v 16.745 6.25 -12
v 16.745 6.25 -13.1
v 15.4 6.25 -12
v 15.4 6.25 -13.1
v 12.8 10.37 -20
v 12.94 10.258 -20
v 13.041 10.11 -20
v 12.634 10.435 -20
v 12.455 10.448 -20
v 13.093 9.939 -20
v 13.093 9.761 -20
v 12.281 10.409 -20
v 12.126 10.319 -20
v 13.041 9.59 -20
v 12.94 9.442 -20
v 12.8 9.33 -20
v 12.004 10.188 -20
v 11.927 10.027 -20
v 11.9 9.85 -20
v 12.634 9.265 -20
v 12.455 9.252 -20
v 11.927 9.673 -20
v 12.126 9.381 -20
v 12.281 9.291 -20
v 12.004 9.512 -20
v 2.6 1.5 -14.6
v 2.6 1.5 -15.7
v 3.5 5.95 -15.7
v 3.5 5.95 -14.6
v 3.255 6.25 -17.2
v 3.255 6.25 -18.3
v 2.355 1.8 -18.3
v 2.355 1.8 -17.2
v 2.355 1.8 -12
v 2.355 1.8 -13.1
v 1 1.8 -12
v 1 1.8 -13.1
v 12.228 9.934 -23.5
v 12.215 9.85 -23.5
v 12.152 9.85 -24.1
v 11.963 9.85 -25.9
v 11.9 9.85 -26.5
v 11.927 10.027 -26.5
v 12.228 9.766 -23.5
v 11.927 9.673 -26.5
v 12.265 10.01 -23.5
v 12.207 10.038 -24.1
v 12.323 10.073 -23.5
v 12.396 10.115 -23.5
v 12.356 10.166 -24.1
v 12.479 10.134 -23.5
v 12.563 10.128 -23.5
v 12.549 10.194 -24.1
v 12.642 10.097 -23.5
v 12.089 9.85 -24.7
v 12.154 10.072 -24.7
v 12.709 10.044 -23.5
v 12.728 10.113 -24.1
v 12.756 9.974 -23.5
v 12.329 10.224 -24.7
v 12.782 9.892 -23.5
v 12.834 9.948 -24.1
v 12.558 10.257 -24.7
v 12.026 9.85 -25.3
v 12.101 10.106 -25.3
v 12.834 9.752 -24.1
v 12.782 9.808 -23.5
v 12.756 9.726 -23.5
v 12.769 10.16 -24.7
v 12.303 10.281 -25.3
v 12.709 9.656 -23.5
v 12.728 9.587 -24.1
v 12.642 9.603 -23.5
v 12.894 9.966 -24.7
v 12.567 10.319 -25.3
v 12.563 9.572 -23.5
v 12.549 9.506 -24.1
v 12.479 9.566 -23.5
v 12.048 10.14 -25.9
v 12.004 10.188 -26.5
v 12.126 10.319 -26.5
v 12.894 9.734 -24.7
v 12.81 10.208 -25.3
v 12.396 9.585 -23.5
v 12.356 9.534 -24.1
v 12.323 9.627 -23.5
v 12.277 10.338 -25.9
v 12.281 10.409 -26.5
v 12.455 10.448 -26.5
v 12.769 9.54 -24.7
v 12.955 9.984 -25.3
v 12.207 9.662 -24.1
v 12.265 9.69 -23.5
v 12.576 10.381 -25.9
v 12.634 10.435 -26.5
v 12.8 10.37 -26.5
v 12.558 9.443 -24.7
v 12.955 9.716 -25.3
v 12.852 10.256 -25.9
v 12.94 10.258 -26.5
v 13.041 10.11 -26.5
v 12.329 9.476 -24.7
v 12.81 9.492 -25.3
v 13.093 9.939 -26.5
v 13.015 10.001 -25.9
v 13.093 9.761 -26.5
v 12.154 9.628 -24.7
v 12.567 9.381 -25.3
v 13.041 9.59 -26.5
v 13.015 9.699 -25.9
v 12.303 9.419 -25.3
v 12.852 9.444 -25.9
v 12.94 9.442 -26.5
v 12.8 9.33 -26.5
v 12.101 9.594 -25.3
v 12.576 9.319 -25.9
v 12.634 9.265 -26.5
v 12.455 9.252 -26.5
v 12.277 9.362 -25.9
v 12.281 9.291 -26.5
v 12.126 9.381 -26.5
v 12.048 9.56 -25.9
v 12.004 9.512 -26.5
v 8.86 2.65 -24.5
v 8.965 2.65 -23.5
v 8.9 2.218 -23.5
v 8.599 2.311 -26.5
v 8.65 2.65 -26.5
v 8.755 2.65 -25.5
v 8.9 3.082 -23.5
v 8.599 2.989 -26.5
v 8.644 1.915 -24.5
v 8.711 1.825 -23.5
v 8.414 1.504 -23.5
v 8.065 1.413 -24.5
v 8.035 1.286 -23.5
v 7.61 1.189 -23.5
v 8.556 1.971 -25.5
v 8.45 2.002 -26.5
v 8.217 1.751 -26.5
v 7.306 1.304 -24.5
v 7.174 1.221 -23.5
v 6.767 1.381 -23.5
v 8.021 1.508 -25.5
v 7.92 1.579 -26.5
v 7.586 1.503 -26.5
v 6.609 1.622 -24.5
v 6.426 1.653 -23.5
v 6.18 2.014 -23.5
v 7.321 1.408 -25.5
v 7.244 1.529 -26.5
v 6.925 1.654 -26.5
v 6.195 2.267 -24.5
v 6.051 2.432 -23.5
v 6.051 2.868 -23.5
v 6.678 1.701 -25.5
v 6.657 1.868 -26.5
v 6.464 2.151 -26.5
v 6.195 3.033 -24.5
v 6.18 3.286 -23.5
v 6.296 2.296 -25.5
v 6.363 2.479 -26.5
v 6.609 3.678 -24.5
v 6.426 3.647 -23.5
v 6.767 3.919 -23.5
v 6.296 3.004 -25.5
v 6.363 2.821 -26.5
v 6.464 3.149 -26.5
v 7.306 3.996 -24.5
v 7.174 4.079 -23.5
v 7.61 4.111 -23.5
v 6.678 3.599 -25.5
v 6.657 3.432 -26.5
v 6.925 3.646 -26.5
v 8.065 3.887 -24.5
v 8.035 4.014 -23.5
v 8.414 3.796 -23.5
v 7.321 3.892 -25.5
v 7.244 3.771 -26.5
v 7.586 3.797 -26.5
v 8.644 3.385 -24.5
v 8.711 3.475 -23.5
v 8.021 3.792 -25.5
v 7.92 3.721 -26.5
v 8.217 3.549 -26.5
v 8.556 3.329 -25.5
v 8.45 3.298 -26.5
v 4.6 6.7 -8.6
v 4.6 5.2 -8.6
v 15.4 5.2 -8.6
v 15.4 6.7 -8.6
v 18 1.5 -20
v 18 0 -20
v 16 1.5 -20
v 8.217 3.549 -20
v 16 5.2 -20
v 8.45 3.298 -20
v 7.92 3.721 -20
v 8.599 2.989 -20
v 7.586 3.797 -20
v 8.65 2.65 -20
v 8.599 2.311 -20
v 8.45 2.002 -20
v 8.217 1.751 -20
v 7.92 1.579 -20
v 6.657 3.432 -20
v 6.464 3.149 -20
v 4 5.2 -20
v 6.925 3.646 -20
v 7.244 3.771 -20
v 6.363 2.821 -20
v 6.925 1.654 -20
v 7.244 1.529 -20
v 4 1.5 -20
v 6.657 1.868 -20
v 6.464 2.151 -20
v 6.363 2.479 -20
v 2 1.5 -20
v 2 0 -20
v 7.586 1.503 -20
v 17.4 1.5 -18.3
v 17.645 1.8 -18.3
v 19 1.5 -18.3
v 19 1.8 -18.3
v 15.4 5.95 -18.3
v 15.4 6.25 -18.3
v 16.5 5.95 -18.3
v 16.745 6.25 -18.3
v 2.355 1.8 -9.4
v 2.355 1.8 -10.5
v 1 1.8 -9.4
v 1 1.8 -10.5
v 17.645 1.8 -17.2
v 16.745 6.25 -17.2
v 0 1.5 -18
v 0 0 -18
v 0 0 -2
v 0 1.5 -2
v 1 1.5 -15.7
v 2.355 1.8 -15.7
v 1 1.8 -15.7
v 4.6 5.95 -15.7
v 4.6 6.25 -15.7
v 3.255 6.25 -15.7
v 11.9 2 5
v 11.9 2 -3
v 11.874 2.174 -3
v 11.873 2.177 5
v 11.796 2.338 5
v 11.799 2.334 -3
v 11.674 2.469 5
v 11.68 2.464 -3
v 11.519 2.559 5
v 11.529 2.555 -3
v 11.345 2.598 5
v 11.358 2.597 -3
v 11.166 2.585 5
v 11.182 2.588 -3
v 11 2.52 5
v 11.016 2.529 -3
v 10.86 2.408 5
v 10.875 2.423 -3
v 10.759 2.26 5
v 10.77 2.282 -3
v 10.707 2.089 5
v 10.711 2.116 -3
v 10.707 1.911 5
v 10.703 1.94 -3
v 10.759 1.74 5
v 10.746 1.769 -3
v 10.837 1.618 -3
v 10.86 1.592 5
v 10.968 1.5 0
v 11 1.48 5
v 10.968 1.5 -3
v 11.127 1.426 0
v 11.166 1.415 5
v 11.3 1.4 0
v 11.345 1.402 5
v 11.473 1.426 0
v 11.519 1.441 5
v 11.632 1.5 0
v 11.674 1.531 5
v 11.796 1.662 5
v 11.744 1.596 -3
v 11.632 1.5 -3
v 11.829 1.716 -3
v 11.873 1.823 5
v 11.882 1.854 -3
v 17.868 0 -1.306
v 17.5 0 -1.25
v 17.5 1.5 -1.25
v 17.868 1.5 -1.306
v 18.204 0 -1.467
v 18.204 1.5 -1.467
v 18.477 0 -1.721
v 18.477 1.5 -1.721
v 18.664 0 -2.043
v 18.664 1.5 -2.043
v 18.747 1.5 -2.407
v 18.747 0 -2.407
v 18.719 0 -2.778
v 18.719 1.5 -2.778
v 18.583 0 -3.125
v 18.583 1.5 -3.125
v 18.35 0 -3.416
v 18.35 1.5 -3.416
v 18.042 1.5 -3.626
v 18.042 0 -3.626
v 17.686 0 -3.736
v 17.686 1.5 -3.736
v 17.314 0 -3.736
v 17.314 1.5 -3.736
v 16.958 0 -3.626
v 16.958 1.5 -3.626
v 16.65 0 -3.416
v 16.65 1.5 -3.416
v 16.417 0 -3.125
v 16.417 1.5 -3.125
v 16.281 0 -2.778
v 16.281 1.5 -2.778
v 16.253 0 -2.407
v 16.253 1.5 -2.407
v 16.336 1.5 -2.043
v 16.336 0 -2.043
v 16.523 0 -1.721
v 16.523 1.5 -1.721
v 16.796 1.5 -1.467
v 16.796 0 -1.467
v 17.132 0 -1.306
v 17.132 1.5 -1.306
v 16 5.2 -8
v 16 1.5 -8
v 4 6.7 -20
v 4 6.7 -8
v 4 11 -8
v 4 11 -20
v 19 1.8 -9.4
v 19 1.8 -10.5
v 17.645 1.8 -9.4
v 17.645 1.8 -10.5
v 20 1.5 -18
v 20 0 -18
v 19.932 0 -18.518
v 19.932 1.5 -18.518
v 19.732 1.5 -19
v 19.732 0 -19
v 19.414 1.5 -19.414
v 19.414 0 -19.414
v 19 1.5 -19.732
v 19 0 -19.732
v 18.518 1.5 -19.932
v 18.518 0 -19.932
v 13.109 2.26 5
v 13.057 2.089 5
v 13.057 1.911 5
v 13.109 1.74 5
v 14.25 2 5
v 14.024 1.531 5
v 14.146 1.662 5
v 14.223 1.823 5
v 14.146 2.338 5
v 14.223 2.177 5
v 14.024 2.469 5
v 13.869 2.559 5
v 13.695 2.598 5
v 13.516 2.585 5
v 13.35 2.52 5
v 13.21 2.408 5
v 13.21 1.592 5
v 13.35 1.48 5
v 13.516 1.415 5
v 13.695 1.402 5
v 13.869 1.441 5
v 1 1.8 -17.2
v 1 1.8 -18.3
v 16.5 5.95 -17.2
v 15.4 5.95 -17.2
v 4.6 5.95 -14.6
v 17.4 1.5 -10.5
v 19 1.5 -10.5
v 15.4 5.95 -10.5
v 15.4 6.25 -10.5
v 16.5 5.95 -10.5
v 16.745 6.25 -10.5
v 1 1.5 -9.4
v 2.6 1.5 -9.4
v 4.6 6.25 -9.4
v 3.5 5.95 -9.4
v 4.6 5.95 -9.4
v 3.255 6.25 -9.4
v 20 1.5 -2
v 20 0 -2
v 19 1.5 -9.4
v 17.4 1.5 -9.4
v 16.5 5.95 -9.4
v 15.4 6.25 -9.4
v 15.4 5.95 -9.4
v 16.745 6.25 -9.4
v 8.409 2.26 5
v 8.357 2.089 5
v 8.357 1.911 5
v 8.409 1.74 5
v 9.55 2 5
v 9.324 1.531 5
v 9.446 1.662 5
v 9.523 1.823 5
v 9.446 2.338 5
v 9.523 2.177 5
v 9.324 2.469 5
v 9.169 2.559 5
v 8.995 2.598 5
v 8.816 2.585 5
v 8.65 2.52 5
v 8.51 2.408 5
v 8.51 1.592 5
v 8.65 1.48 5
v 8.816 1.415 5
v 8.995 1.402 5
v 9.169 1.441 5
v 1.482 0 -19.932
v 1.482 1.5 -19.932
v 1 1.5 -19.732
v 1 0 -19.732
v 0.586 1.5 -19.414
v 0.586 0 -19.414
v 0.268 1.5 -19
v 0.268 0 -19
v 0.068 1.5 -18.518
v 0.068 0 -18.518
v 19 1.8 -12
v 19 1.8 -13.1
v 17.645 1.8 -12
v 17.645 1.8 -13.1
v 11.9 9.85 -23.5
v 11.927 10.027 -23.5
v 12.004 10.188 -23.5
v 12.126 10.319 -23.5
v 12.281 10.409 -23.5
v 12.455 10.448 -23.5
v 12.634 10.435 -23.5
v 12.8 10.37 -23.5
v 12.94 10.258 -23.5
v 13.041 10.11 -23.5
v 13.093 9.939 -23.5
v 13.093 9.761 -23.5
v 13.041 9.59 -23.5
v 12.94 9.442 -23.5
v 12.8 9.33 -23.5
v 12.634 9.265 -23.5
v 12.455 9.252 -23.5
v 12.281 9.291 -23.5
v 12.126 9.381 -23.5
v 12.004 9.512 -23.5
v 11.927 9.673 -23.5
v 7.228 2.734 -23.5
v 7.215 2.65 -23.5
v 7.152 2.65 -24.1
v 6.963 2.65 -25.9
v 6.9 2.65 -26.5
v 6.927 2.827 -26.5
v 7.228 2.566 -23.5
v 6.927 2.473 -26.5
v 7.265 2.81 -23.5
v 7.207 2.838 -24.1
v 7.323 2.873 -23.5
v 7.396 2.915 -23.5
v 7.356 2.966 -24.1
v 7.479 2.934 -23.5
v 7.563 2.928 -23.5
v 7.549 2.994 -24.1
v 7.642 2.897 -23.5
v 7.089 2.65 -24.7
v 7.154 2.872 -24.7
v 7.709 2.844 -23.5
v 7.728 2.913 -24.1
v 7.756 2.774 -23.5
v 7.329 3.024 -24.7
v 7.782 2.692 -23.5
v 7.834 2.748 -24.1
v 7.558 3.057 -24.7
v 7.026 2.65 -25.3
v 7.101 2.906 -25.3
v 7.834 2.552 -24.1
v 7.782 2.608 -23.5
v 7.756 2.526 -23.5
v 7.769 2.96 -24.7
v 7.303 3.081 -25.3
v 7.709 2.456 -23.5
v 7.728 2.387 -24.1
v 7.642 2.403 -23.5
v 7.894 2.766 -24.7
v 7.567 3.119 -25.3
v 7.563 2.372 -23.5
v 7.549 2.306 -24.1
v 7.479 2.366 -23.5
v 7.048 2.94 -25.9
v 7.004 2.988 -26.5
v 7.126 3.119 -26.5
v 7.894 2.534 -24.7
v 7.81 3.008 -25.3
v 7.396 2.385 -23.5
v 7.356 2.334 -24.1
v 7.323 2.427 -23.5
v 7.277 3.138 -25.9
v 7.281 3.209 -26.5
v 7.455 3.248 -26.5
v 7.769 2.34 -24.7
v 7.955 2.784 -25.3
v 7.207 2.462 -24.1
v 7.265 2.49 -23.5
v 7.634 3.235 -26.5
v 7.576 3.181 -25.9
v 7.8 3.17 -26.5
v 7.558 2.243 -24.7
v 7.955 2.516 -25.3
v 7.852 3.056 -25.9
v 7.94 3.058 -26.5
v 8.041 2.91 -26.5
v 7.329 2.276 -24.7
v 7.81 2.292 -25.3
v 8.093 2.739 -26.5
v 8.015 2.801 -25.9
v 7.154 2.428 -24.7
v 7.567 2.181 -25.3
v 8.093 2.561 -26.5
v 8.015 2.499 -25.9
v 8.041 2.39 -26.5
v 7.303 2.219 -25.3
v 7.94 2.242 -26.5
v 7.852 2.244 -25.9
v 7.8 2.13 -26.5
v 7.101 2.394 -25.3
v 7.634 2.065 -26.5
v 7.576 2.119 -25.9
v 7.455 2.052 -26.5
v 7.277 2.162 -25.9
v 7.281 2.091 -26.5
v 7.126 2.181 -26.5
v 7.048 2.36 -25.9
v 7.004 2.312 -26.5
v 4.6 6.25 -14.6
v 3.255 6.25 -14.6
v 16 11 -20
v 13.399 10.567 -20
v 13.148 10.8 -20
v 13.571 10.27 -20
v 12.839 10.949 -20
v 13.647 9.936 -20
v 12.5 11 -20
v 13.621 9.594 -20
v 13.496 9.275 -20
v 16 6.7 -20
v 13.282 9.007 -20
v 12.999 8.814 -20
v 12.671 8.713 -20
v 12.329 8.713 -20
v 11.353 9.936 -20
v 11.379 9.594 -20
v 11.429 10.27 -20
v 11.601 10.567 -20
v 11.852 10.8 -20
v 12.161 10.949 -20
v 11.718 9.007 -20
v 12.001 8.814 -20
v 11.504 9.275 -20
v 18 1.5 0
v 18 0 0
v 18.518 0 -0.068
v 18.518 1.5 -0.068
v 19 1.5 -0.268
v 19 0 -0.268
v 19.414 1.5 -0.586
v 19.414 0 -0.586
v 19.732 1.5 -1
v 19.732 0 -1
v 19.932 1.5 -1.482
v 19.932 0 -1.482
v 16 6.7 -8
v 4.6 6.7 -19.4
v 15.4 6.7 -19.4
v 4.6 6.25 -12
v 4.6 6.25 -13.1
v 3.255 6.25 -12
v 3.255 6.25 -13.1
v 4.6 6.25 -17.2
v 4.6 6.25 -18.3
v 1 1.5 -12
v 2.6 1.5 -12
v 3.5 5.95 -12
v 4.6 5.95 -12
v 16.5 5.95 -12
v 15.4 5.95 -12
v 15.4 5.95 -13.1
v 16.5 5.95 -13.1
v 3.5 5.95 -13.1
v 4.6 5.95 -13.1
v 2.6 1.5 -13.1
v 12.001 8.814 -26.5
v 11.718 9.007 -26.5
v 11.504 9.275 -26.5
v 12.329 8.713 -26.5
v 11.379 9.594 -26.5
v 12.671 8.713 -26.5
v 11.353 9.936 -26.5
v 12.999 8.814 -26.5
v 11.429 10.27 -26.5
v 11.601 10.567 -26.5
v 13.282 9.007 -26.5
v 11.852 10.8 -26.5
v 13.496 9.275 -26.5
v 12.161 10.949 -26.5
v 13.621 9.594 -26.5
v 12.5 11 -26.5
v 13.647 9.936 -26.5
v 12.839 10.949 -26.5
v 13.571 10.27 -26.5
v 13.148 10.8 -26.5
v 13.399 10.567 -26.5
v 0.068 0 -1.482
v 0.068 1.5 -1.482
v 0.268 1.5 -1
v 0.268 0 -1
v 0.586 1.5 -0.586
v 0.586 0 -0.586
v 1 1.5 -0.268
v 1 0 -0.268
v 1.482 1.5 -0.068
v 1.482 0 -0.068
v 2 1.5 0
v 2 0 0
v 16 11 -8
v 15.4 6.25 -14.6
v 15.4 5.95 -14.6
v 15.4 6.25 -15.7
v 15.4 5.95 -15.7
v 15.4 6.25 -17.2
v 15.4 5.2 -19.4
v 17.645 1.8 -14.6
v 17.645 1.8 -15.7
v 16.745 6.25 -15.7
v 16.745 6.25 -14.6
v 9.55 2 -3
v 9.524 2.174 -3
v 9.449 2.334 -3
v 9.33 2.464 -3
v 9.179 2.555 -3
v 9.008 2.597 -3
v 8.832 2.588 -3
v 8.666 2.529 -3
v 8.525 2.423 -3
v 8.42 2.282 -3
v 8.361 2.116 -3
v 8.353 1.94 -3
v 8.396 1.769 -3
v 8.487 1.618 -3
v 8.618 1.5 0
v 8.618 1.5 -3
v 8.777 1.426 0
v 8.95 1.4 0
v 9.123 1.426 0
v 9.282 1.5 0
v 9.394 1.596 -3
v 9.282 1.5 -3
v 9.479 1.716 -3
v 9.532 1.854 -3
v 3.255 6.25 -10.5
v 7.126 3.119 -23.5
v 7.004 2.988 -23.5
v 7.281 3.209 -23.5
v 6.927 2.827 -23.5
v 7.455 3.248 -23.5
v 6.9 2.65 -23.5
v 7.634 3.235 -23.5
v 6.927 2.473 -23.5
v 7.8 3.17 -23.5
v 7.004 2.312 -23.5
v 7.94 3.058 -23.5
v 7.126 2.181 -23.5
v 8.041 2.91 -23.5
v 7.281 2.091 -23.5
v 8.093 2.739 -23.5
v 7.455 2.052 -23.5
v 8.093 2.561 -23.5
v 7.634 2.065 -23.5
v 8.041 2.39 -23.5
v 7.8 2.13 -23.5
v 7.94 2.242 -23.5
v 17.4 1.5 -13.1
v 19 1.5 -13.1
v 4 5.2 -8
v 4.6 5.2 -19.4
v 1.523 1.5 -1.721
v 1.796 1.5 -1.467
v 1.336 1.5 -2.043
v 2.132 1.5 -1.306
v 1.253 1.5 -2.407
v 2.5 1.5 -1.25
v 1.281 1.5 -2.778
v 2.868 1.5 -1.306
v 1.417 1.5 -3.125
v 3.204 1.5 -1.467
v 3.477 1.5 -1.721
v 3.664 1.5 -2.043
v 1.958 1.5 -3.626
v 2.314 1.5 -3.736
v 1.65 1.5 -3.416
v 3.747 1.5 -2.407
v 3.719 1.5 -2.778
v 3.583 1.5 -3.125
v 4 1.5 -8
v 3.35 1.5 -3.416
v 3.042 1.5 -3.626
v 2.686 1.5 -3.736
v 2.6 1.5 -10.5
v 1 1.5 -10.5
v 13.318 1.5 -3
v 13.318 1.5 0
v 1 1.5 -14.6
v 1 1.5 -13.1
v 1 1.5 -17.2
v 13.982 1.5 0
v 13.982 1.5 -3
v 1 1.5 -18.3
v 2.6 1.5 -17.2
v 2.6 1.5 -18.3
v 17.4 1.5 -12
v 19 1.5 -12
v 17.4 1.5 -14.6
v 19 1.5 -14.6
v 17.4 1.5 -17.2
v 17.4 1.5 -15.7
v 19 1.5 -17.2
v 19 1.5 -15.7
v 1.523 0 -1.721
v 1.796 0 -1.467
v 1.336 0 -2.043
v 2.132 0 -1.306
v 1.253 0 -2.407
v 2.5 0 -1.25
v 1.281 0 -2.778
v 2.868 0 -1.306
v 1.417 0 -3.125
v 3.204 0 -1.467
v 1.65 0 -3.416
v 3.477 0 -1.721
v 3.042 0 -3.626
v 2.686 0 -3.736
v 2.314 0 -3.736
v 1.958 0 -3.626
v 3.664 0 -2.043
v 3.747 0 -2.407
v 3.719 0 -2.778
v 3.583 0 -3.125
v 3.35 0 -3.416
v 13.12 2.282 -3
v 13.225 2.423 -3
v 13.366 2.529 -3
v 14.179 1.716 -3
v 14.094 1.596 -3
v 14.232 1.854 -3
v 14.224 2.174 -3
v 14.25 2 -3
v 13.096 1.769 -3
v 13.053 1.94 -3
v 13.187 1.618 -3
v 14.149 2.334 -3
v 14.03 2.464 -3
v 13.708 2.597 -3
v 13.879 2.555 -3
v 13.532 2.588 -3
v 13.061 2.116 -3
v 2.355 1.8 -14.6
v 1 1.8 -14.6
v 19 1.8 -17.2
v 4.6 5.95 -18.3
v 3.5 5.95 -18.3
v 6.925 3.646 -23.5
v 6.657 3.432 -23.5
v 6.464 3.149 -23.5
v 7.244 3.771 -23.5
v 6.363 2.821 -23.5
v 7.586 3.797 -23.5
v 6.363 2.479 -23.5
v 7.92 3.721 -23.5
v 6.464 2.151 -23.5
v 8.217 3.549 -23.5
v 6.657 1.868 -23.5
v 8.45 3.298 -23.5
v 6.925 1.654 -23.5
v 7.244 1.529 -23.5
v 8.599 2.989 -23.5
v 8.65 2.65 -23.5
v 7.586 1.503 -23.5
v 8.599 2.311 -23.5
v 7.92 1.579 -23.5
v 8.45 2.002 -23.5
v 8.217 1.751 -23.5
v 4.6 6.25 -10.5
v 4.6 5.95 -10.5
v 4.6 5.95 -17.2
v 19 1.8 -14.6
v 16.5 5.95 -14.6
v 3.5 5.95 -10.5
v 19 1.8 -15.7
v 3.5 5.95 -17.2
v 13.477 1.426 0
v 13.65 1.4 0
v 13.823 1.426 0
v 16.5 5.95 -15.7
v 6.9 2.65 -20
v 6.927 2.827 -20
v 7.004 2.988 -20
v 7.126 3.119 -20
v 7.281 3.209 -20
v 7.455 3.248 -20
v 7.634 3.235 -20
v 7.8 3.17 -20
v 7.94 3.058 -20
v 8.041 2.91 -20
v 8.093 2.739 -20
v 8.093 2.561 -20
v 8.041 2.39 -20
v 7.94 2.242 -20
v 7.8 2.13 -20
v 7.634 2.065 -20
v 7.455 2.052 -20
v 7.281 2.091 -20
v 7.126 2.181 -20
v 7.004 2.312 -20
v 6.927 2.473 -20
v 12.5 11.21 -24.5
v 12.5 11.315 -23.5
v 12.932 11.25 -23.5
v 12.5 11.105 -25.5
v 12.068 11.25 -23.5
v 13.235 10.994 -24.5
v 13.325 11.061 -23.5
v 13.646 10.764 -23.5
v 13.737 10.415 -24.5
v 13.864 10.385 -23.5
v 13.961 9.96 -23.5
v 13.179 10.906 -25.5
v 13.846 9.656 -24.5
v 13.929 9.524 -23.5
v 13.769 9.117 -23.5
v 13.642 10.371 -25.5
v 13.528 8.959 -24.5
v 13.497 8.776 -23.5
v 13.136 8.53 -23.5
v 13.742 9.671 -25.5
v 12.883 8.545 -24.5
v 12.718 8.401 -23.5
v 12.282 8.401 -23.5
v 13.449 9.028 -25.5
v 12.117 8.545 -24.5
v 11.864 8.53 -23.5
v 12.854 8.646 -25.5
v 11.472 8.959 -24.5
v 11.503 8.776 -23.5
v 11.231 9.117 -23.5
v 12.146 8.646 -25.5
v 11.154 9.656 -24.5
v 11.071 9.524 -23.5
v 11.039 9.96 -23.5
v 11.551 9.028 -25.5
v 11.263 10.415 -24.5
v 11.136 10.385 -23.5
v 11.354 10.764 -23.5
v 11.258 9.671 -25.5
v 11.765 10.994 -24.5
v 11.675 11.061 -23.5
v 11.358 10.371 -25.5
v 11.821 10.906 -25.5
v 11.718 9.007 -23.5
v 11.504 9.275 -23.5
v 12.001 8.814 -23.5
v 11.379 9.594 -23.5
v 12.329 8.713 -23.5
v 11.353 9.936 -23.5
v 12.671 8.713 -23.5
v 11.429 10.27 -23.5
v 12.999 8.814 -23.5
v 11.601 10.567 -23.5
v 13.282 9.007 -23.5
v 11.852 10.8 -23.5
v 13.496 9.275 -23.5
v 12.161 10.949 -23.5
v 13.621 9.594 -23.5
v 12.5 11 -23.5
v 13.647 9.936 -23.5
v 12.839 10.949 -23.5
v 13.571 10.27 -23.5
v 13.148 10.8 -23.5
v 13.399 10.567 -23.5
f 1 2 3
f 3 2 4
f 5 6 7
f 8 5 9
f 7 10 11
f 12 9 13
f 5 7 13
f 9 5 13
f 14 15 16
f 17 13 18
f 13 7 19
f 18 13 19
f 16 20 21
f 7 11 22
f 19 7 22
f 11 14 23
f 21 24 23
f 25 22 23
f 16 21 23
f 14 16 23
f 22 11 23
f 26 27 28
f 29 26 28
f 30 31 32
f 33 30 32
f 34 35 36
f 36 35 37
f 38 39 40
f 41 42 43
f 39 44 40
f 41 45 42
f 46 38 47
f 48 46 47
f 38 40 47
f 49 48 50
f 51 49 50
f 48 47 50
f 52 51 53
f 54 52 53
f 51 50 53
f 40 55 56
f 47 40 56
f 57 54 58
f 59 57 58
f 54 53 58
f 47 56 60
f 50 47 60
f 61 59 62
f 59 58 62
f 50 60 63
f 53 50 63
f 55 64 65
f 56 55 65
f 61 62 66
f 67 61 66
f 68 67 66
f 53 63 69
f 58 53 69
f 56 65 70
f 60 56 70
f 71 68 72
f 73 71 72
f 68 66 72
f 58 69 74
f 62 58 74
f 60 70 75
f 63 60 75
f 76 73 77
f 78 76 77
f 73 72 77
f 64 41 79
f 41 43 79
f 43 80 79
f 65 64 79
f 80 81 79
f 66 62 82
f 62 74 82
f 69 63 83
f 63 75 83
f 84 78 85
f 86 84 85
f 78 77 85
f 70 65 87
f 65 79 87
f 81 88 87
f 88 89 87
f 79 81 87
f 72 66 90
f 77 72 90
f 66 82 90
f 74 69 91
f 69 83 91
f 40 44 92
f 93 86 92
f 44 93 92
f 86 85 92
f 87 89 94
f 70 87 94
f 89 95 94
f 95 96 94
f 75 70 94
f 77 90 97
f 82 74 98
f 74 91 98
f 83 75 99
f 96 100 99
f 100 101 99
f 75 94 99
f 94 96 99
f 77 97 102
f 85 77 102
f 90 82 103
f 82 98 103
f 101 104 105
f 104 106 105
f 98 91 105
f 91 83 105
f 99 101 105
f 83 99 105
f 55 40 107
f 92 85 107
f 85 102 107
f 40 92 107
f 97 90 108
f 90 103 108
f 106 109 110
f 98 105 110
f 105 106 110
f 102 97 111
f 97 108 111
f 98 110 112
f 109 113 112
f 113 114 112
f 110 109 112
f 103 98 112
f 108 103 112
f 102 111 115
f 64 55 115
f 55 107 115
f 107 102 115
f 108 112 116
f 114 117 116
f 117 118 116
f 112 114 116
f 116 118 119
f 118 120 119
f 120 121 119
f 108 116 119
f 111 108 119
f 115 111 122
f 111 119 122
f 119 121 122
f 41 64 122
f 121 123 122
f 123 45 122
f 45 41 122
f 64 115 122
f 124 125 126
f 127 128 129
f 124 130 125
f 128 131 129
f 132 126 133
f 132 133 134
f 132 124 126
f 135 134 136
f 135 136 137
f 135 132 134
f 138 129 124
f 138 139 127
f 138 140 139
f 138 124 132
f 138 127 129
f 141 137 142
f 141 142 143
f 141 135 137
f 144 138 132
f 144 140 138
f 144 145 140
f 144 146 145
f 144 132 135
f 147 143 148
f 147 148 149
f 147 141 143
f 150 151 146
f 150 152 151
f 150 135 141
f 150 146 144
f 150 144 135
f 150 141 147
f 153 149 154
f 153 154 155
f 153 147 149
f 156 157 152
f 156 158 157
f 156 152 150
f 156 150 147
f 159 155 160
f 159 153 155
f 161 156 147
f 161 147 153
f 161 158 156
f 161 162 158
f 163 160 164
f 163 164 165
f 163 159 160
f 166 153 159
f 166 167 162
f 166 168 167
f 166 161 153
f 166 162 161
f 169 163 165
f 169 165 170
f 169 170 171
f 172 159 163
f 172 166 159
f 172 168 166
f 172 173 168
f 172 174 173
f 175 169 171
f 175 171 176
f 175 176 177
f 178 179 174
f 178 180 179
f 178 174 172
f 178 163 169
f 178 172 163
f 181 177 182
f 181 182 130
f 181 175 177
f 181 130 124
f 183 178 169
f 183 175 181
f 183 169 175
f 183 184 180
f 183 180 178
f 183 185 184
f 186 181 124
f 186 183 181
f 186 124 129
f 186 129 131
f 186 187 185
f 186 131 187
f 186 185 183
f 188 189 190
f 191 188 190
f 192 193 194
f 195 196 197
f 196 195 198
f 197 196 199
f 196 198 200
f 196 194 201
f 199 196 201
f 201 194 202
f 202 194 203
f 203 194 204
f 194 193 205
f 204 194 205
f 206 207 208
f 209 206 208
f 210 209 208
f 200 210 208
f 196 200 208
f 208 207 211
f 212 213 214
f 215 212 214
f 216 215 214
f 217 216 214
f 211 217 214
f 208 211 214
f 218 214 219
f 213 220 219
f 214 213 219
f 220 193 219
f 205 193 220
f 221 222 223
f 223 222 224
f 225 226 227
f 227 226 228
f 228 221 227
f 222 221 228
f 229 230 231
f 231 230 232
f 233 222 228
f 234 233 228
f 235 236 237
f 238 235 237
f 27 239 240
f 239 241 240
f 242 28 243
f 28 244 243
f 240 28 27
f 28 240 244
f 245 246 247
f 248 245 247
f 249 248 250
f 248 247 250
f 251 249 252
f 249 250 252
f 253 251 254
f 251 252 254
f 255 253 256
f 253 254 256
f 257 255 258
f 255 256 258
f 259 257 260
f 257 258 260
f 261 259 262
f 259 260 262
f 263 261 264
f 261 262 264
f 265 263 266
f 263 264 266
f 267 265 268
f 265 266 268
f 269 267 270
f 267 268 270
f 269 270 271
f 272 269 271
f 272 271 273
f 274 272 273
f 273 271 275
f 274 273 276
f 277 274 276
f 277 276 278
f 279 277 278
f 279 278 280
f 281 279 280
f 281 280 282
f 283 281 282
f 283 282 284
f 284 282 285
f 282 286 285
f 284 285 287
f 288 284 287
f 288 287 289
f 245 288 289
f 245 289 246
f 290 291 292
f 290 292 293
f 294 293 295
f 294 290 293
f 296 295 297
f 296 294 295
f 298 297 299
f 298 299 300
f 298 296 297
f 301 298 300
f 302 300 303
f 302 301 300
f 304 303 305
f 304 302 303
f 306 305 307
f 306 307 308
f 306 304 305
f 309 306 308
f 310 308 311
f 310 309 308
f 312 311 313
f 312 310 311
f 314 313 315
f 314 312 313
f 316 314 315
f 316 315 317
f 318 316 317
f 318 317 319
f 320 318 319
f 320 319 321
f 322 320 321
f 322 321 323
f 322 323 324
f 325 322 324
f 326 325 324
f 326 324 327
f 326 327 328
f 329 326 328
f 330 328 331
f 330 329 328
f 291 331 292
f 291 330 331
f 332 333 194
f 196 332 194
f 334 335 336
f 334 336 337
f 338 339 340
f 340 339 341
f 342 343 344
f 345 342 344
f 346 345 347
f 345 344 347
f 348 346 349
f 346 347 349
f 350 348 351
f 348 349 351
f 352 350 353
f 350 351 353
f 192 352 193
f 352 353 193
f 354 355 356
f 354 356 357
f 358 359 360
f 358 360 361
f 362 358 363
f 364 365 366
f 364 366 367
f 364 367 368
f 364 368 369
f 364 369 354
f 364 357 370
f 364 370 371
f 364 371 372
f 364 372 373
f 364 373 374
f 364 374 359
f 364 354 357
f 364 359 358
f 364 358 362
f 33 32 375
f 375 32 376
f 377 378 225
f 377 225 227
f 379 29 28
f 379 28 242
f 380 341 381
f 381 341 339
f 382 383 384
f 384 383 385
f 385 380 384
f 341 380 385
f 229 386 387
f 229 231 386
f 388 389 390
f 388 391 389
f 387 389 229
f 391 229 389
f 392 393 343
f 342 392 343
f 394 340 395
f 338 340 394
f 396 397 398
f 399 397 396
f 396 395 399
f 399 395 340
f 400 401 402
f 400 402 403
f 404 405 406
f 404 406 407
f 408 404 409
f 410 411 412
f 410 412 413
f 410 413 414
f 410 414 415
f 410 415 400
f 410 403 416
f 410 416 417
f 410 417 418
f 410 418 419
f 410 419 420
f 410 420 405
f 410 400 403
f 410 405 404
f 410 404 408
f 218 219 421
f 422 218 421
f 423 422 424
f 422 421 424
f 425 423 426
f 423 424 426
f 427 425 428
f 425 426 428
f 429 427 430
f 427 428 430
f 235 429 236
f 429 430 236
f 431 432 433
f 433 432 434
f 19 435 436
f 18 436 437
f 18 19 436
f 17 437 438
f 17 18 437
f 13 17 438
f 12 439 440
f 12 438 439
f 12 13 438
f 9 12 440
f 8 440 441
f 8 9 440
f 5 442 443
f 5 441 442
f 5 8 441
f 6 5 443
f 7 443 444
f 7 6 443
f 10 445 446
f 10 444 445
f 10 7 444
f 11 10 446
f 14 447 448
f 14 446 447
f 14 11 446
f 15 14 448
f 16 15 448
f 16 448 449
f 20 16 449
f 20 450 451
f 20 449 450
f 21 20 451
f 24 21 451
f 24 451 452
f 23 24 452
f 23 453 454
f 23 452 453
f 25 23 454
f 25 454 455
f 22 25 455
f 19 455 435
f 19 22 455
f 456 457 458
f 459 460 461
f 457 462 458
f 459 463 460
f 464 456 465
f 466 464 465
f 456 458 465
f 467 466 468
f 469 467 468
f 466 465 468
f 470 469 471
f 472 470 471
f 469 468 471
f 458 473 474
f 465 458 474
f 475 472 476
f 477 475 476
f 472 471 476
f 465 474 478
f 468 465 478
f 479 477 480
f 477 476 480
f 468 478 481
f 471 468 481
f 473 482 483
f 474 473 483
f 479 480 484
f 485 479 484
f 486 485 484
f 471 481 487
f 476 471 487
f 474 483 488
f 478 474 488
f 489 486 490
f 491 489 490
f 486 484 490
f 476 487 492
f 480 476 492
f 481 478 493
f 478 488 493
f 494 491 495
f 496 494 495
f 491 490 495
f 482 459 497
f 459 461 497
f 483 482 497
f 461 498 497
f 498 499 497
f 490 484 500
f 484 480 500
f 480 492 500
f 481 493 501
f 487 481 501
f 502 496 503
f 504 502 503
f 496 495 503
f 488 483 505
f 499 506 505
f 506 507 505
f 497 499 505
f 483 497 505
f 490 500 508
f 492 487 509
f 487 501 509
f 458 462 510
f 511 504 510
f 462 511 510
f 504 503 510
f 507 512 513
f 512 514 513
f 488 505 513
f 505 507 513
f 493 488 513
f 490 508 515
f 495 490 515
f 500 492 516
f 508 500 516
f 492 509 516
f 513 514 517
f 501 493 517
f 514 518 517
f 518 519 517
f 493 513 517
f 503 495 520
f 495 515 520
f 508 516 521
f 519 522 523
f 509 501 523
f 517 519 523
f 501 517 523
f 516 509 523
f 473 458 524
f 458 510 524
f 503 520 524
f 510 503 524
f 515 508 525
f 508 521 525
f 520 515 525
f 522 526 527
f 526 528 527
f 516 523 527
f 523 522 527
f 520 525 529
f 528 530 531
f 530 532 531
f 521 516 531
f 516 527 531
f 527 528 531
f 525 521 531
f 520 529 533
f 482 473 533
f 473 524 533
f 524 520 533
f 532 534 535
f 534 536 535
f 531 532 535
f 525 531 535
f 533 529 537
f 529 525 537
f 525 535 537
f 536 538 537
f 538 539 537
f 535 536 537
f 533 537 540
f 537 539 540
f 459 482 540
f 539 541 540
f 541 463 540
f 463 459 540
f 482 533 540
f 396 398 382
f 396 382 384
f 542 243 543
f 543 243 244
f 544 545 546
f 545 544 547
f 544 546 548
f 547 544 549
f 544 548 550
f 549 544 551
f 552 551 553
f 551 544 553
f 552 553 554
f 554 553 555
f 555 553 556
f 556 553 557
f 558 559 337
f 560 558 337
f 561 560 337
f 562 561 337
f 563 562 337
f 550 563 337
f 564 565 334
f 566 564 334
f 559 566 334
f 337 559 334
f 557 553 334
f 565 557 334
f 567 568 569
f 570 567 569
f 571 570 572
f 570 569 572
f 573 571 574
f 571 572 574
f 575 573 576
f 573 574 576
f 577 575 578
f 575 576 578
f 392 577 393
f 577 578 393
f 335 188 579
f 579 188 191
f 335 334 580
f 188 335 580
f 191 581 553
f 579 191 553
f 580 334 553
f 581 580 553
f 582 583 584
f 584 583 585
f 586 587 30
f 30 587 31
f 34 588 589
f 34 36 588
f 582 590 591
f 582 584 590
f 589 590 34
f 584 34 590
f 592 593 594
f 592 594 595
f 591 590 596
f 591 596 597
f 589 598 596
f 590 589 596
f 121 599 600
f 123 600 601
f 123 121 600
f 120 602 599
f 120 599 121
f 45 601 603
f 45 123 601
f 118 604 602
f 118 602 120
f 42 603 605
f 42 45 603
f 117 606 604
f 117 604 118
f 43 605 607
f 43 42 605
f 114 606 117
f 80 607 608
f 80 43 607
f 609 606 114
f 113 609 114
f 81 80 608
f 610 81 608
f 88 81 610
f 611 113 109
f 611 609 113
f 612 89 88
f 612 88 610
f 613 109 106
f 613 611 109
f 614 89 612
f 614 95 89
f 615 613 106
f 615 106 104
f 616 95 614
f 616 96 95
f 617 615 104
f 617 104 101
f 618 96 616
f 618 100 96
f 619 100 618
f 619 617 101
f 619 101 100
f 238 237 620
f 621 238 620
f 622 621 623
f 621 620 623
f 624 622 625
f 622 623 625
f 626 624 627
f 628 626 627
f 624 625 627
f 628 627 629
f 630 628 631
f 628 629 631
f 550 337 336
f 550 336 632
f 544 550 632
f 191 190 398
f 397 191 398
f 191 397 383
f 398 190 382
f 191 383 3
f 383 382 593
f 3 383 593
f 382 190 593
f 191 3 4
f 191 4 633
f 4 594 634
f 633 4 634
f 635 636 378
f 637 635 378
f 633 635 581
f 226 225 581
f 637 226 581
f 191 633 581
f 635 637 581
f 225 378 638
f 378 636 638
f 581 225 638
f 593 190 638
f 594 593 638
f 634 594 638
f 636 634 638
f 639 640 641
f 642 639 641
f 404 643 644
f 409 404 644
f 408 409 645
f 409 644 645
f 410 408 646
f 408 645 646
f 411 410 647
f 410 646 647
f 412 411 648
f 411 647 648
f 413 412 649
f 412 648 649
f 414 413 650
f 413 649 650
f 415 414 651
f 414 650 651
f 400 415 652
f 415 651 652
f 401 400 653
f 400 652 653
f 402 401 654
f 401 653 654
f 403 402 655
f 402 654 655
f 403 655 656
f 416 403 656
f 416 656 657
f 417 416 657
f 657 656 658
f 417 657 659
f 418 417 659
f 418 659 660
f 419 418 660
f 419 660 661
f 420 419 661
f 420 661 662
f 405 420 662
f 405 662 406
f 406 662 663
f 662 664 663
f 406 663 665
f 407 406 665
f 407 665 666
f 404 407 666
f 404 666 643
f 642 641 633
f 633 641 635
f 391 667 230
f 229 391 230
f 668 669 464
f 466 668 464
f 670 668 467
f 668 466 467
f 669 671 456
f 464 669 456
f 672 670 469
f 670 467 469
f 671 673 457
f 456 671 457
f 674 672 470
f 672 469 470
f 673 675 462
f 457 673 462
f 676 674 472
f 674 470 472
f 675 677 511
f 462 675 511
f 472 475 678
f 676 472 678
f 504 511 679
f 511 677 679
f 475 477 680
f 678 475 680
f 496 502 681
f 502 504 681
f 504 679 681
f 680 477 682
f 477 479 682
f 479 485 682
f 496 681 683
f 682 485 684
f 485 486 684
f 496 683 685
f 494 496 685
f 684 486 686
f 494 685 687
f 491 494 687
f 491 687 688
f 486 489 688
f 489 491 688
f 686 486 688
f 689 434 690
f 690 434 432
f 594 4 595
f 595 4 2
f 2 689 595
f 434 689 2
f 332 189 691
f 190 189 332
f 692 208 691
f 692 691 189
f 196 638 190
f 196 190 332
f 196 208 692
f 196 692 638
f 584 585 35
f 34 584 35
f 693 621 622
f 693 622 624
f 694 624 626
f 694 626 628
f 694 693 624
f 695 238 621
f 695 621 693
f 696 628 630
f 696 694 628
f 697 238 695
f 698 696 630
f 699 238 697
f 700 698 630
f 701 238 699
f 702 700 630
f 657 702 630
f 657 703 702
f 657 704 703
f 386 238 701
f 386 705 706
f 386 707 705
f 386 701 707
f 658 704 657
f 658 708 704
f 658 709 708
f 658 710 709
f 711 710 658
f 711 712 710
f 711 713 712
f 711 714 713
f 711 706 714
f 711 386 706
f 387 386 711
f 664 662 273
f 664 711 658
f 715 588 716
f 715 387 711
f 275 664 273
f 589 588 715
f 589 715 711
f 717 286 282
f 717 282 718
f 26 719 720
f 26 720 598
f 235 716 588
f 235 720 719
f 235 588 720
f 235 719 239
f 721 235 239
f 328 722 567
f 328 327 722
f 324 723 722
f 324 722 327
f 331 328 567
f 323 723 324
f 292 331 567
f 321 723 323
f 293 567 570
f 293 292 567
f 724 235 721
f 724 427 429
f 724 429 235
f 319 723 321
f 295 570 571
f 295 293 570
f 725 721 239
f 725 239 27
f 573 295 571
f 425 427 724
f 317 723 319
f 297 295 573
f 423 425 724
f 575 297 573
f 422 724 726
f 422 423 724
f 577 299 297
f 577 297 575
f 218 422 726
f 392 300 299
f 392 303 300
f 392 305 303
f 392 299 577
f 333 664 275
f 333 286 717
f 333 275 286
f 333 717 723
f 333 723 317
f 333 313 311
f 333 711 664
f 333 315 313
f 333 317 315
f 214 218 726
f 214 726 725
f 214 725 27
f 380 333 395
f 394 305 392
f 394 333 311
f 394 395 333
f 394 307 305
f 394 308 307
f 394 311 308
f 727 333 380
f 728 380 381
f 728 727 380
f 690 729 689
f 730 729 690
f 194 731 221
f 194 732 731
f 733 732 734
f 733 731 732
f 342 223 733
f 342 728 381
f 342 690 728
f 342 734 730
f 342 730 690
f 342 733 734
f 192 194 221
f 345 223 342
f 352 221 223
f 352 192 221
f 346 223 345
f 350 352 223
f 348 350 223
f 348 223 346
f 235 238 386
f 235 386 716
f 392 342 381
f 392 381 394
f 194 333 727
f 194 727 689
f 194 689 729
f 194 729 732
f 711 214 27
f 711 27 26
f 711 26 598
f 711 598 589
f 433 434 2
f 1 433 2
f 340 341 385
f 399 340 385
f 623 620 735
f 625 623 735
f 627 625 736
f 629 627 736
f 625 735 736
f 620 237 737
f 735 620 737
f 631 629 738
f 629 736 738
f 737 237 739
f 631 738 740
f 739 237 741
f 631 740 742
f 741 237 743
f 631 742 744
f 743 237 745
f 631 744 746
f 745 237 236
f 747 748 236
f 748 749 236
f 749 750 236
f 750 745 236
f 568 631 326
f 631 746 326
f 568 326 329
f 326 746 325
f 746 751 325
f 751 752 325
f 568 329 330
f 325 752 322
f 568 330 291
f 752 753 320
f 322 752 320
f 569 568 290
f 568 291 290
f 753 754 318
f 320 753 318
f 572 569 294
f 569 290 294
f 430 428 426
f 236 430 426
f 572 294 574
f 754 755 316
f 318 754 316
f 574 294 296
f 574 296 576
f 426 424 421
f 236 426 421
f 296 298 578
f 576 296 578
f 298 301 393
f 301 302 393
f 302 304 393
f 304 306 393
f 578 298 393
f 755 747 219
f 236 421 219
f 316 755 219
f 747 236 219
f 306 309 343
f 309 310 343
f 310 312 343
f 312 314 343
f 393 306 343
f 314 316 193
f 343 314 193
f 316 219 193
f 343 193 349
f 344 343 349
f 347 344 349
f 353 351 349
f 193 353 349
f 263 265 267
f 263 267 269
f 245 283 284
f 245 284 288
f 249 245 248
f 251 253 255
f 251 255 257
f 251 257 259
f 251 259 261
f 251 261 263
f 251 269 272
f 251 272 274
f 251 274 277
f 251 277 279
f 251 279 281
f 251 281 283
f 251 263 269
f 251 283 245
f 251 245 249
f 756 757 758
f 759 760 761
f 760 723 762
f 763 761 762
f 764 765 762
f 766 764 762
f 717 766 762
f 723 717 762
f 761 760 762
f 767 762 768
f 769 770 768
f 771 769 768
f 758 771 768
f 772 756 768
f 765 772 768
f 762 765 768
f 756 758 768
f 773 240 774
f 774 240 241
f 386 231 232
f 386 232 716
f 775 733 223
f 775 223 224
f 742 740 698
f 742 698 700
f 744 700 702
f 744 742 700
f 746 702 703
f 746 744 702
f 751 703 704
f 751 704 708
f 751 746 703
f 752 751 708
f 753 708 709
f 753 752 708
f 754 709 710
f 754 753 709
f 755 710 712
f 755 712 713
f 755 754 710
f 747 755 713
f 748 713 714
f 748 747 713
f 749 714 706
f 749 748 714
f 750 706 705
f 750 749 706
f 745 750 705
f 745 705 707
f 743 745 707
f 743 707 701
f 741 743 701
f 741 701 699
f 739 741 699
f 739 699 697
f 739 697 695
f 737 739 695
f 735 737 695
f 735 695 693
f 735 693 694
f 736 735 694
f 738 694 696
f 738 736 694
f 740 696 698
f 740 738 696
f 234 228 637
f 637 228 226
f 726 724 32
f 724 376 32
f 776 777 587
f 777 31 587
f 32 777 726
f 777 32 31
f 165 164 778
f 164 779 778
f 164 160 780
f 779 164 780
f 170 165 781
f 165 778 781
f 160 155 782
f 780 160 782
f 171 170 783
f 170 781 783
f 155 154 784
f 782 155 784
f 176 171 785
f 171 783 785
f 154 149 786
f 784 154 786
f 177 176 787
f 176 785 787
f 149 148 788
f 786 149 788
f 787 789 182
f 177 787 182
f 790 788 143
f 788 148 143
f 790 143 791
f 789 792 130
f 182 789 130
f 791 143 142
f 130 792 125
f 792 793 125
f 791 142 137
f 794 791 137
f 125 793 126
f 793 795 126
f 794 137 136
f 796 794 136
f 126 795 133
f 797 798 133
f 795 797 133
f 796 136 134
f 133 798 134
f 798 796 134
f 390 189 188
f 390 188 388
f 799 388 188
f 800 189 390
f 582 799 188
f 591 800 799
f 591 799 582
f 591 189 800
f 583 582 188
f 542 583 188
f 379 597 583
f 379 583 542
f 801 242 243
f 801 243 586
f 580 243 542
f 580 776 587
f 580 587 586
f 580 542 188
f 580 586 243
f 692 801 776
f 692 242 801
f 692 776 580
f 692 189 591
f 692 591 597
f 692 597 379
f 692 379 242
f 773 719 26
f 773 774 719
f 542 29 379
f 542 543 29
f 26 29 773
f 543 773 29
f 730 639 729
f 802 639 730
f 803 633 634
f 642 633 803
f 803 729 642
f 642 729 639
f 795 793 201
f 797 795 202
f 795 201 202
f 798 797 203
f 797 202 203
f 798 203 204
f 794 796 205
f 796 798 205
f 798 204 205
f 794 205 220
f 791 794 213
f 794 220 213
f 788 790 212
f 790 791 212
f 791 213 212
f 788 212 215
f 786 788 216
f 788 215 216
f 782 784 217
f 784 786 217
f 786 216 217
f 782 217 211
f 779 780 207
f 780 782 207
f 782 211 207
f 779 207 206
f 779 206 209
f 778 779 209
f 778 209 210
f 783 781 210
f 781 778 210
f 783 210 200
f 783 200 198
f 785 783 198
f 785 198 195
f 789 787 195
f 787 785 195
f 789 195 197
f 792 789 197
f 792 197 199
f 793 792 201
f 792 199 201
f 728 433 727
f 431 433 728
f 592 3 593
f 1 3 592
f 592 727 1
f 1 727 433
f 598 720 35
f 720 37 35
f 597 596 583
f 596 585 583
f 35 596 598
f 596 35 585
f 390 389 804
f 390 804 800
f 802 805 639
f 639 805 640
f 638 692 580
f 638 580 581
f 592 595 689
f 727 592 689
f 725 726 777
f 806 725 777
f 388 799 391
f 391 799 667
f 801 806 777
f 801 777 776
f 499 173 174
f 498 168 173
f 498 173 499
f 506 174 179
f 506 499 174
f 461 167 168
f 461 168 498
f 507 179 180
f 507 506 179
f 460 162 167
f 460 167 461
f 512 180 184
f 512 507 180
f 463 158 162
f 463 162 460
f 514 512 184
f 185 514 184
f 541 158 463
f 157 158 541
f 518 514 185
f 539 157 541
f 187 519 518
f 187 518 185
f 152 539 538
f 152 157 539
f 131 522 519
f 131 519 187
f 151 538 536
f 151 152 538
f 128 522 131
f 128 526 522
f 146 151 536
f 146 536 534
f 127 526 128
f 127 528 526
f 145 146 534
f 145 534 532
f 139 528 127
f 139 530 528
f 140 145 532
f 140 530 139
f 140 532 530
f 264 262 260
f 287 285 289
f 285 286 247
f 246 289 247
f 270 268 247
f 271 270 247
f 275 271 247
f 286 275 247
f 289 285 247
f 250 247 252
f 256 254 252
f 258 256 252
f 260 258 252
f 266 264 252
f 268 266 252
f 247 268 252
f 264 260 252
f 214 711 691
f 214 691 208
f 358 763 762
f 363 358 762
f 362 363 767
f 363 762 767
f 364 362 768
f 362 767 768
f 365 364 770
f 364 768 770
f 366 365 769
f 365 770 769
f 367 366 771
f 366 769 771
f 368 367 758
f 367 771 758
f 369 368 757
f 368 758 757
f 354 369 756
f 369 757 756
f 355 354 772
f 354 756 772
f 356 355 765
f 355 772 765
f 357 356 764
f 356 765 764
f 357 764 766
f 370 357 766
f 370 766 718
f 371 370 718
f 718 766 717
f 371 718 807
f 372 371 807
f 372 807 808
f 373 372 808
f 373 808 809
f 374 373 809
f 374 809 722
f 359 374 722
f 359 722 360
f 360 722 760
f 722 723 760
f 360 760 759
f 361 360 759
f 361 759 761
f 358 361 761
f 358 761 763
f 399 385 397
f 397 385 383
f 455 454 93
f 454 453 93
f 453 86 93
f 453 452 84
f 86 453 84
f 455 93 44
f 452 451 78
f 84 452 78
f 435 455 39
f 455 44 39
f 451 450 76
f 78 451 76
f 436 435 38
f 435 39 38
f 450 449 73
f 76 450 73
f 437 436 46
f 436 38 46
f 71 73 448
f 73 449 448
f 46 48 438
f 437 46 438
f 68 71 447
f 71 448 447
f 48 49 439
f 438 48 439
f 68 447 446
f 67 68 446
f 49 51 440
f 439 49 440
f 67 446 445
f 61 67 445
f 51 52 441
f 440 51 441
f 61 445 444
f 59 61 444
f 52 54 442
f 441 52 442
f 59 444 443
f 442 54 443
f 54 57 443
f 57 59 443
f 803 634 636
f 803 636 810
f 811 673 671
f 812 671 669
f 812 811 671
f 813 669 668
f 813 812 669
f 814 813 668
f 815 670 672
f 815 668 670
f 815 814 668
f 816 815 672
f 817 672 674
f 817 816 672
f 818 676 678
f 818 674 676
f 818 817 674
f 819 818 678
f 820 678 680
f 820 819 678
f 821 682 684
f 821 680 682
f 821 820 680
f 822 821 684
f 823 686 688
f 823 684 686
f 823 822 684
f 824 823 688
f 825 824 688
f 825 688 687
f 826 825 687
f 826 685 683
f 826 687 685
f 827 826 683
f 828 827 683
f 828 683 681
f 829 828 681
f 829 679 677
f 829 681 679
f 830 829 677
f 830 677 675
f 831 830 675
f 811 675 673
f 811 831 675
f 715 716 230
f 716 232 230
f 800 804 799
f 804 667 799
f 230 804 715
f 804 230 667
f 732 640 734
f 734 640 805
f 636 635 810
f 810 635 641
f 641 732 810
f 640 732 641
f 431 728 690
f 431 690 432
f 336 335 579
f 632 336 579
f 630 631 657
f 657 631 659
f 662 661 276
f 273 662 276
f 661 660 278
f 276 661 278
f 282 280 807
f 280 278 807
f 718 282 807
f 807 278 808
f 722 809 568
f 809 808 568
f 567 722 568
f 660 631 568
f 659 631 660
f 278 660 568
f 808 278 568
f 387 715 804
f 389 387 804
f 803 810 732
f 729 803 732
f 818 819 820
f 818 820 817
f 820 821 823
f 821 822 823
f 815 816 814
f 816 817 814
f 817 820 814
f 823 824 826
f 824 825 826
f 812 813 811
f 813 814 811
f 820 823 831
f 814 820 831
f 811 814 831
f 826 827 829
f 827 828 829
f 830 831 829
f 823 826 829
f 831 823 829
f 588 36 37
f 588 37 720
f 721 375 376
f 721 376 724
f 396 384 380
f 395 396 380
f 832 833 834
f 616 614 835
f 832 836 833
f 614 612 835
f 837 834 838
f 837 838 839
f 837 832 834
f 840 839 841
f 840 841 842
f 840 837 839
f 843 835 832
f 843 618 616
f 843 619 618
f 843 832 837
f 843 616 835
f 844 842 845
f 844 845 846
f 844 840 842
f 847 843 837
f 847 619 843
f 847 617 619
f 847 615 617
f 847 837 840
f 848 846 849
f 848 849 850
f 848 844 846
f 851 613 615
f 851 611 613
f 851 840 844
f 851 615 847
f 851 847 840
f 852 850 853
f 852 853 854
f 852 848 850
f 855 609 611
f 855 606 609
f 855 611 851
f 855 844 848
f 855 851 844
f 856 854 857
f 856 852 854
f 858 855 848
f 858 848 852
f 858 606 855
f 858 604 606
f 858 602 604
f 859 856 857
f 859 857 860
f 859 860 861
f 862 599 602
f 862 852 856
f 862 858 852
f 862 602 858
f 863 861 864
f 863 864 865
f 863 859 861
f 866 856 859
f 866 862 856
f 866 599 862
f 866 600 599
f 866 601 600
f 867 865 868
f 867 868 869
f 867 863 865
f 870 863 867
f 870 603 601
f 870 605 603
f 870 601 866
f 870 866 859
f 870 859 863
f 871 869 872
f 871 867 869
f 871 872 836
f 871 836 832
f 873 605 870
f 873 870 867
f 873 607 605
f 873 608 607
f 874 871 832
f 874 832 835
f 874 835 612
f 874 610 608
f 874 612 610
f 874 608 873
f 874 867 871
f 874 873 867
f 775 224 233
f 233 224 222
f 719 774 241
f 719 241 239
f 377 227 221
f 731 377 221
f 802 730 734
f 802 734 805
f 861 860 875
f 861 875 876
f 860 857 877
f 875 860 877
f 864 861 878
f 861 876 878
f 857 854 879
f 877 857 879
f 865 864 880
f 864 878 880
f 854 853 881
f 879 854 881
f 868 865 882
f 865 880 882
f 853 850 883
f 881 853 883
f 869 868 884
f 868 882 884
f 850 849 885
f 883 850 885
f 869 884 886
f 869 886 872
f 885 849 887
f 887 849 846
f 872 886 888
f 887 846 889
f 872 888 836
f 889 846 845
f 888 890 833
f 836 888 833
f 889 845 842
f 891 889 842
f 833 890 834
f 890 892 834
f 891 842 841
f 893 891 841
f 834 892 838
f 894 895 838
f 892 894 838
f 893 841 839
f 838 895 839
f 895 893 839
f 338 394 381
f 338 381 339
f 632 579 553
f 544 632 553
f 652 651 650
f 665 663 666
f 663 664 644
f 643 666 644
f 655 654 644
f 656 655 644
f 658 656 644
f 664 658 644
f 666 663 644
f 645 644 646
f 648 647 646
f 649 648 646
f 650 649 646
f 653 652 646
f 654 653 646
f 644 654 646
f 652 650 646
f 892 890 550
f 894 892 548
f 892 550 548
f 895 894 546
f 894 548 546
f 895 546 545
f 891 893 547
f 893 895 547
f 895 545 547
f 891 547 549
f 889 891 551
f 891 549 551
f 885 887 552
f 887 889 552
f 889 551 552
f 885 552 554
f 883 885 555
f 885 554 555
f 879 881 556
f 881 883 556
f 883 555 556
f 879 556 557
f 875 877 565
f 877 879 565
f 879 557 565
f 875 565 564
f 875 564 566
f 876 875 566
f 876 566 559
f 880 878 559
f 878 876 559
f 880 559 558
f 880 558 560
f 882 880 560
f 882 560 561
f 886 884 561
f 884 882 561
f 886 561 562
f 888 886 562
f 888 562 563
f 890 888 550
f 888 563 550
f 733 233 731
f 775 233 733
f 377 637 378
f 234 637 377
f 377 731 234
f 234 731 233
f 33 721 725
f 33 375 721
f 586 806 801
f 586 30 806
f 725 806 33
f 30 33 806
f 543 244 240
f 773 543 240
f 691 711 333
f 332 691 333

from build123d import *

# Parameters (mm, degrees)
SKETCH_1_R                = 1.25
EXTRUDE_1_DEPTH           = 1.5
SKETCH_2_W                = 12
SKETCH_2_H                = 12
EXTRUDE_2_DEPTH           = 9.5
CUT_EXTRUDE_START         = 3.7
SKETCH_3_OUTSIDE_W        = 28.07
SKETCH_3_OUTSIDE_H        = 28.07
SKETCH_3_OUTSIDE_W_2      = 10.8
SKETCH_3_OUTSIDE_H_2      = 10.8
CUT_EXTRUDE_1_DEPTH       = 1.5
SKETCH_4_R                = 1.15
SKETCH_4_R_2              = 0.6
EXTRUDE_3_DEPTH           = 6.5
SKETCH_5_R                = 1.15
SKETCH_5_R_2              = 0.6
EXTRUDE_4_DEPTH           = 3
EXTRUDE_4_DRAFT           = 6
EXTRUDE_4_PROFILE_2_DEPTH = 3
EXTRUDE_4_PROFILE_2_DRAFT = 6
EXTRUDE_START             = -1.7
EXTRUDE_1_2_DEPTH         = 1.1
PATTERN_LINEAR_1_COUNT    = 4
PATTERN_LINEAR_1_PITCH    = 2.6
EXTRUDE_5_DEPTH           = 5
EXTRUDE_5_DEPTH_BACK      = 3
SKETCH_7_R                = 0.6


with BuildPart() as part:
    # Эскиз1 → Extrude 1 (new body)
    with BuildSketch(Plane(origin=(0, 0, 0), x_dir=(1, 0, 0), z_dir=(0, 1, 0))):
        with BuildLine():
            Line((2, 0), (18, 0))
            ThreePointArc((18, 0), (19.414213562, 0.585786438), (20, 2))
            Line((20, 2), (20, 18))
            ThreePointArc((20, 18), (19.414213562, 19.414213562), (18, 20))
            Line((18, 20), (2, 20))
            ThreePointArc((2, 20), (0.585786438, 19.414213562), (0, 18))
            Line((0, 18), (0, 2))
            ThreePointArc((0, 2), (0.585786438, 0.585786438), (2, 0))
        make_face()
        with Locations(Location((2.5, 2.5, 0), (0, 0, 270))):
            Circle(SKETCH_1_R, mode=Mode.SUBTRACT)
        with Locations(Location((17.5, 2.5, 0), (0, 0, 270))):
            Circle(SKETCH_1_R, mode=Mode.SUBTRACT)
    extrude(amount=EXTRUDE_1_DEPTH)

    # Эскиз2 → Бобышка-Вытянуть2 (add)
    with BuildSketch(Plane(origin=(0, 1.5, 0), x_dir=(1, 0, 0), z_dir=(0, 1, 0))):
        with Locations((10, 14)):
            Rectangle(SKETCH_2_W, SKETCH_2_H)
    extrude(amount=EXTRUDE_2_DEPTH)

    # Эскиз3 outside → Вырез-Вытянуть1 (cut)
    with BuildSketch(Plane(origin=(0, 1.5, 0), x_dir=(1, 0, 0), z_dir=(0, 1, 0)).offset(CUT_EXTRUDE_START)):
        with Locations((10, 10)):
            Rectangle(SKETCH_3_OUTSIDE_W, SKETCH_3_OUTSIDE_H)
        with Locations((10, 14)):
            Rectangle(SKETCH_3_OUTSIDE_W_2, SKETCH_3_OUTSIDE_H_2, mode=Mode.SUBTRACT)
    extrude(amount=CUT_EXTRUDE_1_DEPTH, mode=Mode.SUBTRACT)

    # Эскиз4 → Бобышка-Вытянуть3 (add)
    # profile 1 of 2: a face of its own
    with BuildSketch(Plane(origin=(0, 0, -20), x_dir=(-1, 0, 0), z_dir=(0, 0, -1))):
        with Locations(Location((-12.5, 9.85, 0), (0, 0, 90))):
            Circle(SKETCH_4_R)
        with Locations((-12.5, 9.85)):
            Circle(SKETCH_4_R_2, mode=Mode.SUBTRACT)
    # profile 2 of 2: a face of its own
    with BuildSketch(Plane(origin=(0, 0, -20), x_dir=(-1, 0, 0), z_dir=(0, 0, -1))):
        with Locations(Location((-7.5, 2.65, 0), (0, 0, 180))):
            Circle(SKETCH_4_R)
        with Locations((-7.5, 2.65)):
            Circle(SKETCH_4_R_2, mode=Mode.SUBTRACT)
    extrude(amount=EXTRUDE_3_DEPTH)


with BuildPart() as extrude_4_tool:
    # Эскиз5 → Бобышка-Вытянуть4 (with draft: the straight prism first)
    with BuildSketch(Plane(origin=(0, 0, -26.5), x_dir=(-1, 0, 0), z_dir=(0, 0, -1))):
        with Locations(Location((-7.5, 2.65, 0), (0, 0, 180))):
            Circle(SKETCH_5_R)
        with Locations((-7.5, 2.65)):
            Circle(SKETCH_5_R_2, mode=Mode.SUBTRACT)
    extrude(amount=-EXTRUDE_4_DEPTH)
    # Бобышка-Вытянуть4: the draft: its side faces are tilted about the plane it starts from
    extrude_4_sides = [extrude_4_tool.faces().sort_by_distance(p)[0] for p in [
        (6.35, 2.65, -25),
        (8.1, 2.65, -25),
    ]]
    draft(extrude_4_sides, Plane(origin=(0, 0, -26.5), x_dir=(-1, 0, 0), z_dir=(0, 0, -1)), EXTRUDE_4_DRAFT)


with BuildPart() as part_1:
    add(part.part)

    # Бобышка-Вытянуть4: add extrude_4_tool
    add(extrude_4_tool.part)


with BuildPart() as extrude_4_profile_2_tool:
    # Эскиз5 → Бобышка-Вытянуть4 profile 2 (with draft: the straight prism first)
    with BuildSketch(Plane(origin=(0, 0, -26.5), x_dir=(-1, 0, 0), z_dir=(0, 0, -1))):
        with Locations(Location((-12.5, 9.85, 0), (0, 0, 90))):
            Circle(SKETCH_5_R)
        with Locations((-12.5, 9.85)):
            Circle(SKETCH_5_R_2, mode=Mode.SUBTRACT)
    extrude(amount=-EXTRUDE_4_PROFILE_2_DEPTH)
    # Бобышка-Вытянуть4 profile 2: the draft: its side faces are tilted about the plane it starts from
    extrude_4_profile_2_sides = [extrude_4_profile_2_tool.faces().sort_by_distance(p)[0] for p in [
        (12.5, 8.7, -25),
        (13.1, 9.85, -25),
    ]]
    draft(extrude_4_profile_2_sides, Plane(origin=(0, 0, -26.5), x_dir=(-1, 0, 0), z_dir=(0, 0, -1)), EXTRUDE_4_PROFILE_2_DRAFT)


with BuildPart() as part_2:
    add(part_1.part)

    # Бобышка-Вытянуть4 profile 2: add extrude_4_profile_2_tool
    add(extrude_4_profile_2_tool.part)

    # Эскиз6 → Extrude 1 2 (add)
    with BuildSketch(Plane(origin=(0, 0, -20), x_dir=(-1, 0, 0), z_dir=(0, 0, -1)).offset(EXTRUDE_START)):
        Polygon((-15.4, 5.95), (-16.5, 5.95), (-17.4, 1.5), (-19, 1.5), (-19, 1.8), (-17.645399941, 1.8), (-16.745399941, 6.25), (-15.4, 6.25), align=None)
        Polygon((-1, 1.5), (-2.6, 1.5), (-3.5, 5.95), (-4.6, 5.95), (-4.6, 6.25), (-3.254600059, 6.25), (-2.354600059, 1.8), (-1, 1.8), align=None)
    extrude_1_2 = extrude(amount=-EXTRUDE_1_2_DEPTH)

    # Линейный массив1: Extrude 1 2 ×4
    with Locations(*[(0, 0, i * PATTERN_LINEAR_1_PITCH) for i in range(1, PATTERN_LINEAR_1_COUNT)]):
        add(extrude_1_2)

    # Эскиз7 → Бобышка-Вытянуть5 (add, two sides: drawn at the far end of the back side and taken through both)
    with BuildSketch(Plane.XY.offset(-EXTRUDE_5_DEPTH_BACK)):
        with Locations((8.95, 2)):
            Circle(SKETCH_7_R)
        with Locations((11.3, 2)):
            Circle(SKETCH_7_R)
        with Locations((13.65, 2)):
            Circle(SKETCH_7_R)
    extrude(amount=EXTRUDE_5_DEPTH + EXTRUDE_5_DEPTH_BACK)


solid = part_2.part
